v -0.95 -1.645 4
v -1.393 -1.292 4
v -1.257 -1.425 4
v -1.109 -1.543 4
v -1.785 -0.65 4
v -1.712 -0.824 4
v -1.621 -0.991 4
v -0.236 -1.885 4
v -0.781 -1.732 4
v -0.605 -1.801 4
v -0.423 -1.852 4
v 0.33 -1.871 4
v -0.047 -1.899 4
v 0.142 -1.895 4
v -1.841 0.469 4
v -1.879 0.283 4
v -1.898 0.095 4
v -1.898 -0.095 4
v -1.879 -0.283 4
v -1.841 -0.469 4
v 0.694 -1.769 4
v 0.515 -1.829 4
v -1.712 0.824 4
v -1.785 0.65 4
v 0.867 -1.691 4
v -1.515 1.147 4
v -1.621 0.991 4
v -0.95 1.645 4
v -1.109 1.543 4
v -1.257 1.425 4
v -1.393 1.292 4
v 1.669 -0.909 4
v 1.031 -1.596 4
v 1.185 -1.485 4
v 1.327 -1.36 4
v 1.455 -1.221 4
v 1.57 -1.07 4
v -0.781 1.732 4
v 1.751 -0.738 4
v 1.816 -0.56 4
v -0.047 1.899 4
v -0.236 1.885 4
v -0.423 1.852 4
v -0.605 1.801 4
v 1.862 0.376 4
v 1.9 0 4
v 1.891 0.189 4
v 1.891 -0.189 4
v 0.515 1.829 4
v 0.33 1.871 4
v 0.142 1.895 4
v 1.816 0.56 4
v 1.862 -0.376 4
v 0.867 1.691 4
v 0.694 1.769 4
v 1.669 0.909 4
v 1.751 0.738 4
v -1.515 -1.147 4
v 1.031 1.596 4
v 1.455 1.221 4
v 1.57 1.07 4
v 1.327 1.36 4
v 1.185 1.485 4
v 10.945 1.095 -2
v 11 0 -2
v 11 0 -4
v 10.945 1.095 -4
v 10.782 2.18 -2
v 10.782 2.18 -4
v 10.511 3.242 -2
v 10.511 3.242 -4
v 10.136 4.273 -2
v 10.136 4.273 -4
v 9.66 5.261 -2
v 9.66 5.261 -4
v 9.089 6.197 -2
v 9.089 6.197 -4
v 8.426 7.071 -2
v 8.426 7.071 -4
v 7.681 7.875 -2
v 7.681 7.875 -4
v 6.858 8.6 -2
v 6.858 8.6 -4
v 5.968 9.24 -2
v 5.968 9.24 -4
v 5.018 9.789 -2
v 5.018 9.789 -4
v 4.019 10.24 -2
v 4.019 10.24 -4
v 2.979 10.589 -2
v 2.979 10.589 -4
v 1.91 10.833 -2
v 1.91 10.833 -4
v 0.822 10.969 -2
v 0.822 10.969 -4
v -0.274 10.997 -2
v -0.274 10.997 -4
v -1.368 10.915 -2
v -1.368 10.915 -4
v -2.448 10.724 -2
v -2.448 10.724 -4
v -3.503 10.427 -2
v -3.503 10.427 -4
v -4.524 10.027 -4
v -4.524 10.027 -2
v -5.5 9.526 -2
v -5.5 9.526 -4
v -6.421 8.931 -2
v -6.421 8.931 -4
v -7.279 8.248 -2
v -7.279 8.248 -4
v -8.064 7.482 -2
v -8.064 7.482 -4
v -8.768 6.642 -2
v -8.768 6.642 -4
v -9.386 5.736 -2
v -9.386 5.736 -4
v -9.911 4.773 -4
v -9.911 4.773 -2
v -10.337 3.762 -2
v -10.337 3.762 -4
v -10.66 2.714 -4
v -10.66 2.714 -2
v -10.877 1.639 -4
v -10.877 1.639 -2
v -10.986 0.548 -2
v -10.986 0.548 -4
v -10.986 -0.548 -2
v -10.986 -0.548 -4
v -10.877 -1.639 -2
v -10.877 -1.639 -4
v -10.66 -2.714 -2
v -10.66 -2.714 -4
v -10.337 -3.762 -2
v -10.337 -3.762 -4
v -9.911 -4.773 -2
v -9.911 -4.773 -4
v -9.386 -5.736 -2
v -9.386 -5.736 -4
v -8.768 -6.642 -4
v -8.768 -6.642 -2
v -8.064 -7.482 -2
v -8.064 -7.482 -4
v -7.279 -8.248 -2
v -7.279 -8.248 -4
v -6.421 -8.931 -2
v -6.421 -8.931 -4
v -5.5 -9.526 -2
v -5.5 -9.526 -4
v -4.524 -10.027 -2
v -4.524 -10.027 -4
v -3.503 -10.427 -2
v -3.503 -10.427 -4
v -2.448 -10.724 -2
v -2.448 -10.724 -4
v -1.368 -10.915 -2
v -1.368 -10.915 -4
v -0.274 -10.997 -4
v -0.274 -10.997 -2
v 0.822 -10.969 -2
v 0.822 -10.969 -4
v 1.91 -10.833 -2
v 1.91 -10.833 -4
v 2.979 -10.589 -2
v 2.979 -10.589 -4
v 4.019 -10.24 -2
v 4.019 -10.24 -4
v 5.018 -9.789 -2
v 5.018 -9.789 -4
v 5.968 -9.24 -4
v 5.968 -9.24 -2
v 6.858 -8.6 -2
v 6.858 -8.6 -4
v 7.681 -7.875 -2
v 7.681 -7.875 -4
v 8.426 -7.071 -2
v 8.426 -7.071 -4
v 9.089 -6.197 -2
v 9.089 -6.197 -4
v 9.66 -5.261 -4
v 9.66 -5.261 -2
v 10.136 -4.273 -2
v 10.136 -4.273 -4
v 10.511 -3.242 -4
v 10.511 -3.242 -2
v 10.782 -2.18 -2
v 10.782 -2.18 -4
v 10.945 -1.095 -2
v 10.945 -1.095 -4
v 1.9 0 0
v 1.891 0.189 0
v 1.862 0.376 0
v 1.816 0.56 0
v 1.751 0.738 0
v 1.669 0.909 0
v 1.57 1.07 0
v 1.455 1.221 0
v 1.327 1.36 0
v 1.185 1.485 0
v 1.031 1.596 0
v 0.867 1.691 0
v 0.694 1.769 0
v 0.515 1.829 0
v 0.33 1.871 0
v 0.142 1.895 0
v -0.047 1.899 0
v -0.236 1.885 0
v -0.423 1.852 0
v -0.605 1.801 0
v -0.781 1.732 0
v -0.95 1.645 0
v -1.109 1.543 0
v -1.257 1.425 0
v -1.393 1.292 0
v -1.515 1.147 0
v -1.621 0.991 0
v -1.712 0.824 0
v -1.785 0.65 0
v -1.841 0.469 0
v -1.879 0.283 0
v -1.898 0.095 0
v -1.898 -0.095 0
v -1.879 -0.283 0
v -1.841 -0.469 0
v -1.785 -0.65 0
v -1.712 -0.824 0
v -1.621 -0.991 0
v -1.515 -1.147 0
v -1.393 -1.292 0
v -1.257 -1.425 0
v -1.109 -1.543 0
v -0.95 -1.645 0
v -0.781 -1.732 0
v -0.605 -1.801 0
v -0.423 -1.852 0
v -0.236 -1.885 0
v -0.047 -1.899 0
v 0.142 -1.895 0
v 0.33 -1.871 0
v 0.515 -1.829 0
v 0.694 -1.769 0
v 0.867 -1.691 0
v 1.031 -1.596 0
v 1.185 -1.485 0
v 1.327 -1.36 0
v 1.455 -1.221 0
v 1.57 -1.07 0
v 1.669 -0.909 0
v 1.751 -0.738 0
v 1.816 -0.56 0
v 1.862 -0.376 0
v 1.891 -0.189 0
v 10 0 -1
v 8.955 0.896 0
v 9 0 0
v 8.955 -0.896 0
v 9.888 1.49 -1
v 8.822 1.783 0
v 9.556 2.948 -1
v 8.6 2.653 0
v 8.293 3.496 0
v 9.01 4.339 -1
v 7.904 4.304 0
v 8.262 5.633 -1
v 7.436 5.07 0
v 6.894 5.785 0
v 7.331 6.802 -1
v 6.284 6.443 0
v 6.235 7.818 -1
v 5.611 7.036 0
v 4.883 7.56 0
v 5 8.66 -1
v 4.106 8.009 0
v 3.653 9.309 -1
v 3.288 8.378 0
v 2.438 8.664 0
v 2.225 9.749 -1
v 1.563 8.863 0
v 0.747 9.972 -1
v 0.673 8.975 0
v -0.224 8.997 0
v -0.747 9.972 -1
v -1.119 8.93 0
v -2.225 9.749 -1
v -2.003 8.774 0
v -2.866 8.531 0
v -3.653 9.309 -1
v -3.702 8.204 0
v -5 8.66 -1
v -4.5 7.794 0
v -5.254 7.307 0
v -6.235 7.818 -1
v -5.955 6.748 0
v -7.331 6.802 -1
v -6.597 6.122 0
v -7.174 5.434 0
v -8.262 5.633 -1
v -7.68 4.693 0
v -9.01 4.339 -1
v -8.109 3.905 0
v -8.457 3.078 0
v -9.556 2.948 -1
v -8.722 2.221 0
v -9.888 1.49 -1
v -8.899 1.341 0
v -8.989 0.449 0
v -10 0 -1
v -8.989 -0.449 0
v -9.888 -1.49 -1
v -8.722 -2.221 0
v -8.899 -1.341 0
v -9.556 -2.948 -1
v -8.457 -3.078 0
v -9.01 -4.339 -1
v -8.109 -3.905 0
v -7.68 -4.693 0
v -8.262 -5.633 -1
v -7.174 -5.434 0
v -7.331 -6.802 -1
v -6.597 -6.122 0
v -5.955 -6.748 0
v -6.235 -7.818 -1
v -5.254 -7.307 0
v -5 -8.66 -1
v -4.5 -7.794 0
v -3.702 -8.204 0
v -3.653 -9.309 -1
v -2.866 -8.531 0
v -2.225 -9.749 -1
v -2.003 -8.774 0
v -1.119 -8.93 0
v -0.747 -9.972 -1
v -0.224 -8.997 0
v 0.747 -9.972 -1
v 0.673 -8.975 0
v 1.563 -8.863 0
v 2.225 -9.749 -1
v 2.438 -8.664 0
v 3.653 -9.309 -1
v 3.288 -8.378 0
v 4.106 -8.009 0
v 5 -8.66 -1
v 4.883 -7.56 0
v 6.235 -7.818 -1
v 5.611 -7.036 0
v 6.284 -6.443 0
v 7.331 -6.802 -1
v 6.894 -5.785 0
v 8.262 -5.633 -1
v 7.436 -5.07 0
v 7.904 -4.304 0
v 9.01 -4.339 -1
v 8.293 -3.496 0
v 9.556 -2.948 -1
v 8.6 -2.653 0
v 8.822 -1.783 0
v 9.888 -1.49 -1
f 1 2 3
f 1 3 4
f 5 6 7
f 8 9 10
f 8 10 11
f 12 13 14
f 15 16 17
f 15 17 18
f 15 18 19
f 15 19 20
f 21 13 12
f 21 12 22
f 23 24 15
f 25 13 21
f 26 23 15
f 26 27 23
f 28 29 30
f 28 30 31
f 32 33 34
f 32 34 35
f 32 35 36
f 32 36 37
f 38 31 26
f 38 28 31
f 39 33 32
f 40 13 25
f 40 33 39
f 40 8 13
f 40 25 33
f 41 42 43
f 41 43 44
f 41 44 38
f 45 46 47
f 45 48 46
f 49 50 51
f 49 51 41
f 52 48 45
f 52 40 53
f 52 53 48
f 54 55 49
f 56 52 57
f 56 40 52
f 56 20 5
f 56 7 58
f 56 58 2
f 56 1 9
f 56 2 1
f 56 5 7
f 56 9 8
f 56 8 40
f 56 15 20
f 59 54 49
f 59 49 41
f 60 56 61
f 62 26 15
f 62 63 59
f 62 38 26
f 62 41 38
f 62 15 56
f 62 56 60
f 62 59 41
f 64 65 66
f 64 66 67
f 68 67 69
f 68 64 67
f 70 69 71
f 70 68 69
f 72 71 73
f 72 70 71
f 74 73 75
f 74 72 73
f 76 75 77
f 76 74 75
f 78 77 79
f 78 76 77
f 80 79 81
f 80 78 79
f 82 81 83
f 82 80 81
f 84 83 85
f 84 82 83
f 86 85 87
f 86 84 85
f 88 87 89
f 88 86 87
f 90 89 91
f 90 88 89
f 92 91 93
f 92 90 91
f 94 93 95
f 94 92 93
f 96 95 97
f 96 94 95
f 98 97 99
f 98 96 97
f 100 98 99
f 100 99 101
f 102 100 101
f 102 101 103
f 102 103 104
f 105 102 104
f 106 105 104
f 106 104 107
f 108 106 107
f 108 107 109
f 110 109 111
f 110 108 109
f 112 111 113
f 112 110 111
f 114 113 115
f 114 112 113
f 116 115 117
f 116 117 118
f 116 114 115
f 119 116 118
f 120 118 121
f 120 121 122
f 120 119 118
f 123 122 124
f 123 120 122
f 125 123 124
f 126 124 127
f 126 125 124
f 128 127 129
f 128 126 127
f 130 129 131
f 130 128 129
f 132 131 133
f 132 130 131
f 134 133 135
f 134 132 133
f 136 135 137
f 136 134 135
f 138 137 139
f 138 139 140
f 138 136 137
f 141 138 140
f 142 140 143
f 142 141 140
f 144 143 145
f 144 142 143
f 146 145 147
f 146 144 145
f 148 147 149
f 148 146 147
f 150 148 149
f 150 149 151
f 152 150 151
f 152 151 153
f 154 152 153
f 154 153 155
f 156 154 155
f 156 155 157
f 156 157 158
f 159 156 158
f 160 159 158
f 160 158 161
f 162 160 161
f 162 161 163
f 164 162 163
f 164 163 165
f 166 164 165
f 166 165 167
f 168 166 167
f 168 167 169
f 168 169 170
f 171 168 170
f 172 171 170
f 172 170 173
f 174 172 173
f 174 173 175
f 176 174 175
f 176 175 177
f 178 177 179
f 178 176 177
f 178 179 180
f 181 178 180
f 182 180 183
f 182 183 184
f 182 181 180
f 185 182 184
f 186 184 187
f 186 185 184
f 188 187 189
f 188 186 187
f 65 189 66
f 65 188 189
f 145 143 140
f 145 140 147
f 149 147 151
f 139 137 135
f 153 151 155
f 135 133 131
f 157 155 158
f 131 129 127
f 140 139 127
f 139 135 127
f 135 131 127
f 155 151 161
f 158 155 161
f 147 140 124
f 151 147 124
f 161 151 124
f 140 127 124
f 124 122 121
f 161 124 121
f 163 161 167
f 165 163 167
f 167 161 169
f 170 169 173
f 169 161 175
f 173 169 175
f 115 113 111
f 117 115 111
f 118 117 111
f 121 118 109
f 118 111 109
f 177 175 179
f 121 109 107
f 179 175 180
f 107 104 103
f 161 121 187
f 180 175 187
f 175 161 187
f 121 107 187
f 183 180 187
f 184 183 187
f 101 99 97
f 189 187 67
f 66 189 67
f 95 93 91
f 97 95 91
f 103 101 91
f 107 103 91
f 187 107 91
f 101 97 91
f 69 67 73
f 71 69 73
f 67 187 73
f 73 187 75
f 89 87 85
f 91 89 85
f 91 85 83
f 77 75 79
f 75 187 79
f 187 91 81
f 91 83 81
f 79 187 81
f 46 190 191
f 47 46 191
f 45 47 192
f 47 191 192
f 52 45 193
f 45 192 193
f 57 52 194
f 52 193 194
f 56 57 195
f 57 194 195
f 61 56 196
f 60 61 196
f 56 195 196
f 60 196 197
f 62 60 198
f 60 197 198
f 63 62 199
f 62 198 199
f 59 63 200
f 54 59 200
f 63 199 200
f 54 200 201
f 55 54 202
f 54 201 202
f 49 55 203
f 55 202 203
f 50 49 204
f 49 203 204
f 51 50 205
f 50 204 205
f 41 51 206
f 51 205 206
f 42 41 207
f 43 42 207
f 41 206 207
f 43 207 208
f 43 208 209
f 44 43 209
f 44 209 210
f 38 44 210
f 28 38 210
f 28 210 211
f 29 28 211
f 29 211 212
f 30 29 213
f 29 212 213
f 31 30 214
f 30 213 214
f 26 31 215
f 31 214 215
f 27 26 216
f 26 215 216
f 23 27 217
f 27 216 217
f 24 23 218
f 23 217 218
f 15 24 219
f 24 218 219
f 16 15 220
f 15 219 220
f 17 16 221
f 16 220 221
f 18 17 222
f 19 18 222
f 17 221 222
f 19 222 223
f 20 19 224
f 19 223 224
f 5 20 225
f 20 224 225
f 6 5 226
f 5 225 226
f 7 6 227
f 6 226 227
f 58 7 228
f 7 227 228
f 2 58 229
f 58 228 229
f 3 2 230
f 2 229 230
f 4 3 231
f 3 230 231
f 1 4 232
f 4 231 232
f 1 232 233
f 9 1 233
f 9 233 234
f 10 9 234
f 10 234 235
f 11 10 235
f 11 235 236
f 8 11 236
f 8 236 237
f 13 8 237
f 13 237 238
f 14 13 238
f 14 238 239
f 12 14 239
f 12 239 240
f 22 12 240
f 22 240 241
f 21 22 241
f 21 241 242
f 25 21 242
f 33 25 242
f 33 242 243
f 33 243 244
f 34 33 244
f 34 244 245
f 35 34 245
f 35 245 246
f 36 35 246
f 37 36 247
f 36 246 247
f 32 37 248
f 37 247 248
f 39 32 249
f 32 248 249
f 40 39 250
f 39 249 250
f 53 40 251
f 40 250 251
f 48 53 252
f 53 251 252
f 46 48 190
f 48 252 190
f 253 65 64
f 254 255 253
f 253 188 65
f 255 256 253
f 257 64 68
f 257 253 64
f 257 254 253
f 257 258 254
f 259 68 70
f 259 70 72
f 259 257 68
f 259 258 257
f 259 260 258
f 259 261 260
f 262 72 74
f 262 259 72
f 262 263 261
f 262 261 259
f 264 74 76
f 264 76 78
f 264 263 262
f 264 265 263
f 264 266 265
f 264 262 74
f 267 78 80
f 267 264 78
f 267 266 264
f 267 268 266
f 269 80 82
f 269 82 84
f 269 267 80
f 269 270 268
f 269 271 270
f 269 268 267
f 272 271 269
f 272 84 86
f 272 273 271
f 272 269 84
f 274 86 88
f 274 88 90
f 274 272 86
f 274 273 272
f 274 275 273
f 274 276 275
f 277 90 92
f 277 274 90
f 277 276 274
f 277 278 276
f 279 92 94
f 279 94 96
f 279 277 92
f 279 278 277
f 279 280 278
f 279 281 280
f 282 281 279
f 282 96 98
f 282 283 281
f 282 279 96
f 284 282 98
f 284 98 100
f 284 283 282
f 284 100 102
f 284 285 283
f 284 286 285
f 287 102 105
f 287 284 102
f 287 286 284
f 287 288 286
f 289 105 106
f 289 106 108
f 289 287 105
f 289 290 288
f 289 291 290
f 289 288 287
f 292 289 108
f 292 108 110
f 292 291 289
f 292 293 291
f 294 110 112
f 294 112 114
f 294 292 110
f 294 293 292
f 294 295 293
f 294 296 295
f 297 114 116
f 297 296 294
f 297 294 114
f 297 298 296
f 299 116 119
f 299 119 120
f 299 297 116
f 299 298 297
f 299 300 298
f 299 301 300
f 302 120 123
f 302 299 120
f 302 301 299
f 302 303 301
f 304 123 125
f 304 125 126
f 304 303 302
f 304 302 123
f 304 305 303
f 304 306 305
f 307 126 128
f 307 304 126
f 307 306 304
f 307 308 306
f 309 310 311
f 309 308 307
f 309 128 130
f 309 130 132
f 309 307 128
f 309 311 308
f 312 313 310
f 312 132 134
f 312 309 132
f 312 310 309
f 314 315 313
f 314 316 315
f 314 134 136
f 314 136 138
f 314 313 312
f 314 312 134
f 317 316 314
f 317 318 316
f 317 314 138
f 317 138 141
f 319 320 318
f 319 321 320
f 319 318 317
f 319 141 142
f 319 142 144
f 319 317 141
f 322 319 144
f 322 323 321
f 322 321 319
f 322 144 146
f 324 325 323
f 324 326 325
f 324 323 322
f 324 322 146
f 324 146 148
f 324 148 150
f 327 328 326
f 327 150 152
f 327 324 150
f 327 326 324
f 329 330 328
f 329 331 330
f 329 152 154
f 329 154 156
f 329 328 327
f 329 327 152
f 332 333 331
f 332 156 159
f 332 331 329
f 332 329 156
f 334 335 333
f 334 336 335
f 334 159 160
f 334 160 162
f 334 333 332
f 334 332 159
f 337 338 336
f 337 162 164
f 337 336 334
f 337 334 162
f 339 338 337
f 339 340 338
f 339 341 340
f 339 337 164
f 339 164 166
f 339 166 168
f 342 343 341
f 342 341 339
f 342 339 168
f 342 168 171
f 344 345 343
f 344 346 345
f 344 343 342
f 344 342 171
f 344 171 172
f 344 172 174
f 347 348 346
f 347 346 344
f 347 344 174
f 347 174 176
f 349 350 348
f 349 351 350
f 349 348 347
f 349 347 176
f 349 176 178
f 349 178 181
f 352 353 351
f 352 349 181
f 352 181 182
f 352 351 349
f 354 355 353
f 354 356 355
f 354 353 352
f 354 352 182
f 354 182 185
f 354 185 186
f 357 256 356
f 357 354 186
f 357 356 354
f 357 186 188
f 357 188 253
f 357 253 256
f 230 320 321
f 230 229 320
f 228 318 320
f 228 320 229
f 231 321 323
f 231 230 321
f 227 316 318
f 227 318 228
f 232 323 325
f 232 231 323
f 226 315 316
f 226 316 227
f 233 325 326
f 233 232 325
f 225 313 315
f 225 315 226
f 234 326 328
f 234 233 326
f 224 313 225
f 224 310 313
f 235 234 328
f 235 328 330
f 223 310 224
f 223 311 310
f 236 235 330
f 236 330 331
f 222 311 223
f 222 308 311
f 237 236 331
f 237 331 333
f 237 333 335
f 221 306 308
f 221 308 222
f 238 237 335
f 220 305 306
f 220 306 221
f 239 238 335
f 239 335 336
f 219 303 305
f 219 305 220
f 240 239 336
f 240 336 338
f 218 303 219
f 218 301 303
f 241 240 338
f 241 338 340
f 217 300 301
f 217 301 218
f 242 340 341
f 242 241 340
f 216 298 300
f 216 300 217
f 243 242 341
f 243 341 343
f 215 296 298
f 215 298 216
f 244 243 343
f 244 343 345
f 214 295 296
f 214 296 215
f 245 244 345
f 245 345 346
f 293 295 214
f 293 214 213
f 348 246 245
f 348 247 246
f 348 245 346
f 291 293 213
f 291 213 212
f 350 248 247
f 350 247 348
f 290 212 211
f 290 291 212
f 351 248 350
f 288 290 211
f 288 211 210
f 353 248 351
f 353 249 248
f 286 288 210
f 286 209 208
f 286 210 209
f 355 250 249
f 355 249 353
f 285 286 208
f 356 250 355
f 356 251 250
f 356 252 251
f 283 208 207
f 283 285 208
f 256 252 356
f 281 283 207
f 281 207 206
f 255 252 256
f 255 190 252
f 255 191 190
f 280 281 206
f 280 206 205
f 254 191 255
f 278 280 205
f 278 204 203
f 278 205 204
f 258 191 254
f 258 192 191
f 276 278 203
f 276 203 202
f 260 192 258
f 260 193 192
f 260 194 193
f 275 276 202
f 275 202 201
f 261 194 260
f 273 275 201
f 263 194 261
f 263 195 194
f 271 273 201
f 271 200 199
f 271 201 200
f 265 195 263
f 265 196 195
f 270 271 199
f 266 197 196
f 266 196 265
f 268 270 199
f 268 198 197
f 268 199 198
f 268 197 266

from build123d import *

# Parameters (mm, degrees)
F0_R     = 11
F1_DEPTH = 4
F2_R     = 1.9
F3_DEPTH = 4
F4_SIZE  = 2


with BuildPart() as f1:
    # F0 (on Top) → F1 (new body)
    with BuildSketch(Plane.XY):
        Circle(F0_R)
    extrude(amount=-F1_DEPTH)

    # F2 (on face) → F3 (join)
    with BuildSketch(Plane.XY):
        Circle(F2_R)
    extrude(amount=F3_DEPTH)

    # F4
    f4_edges = [f1.edges().sort_by_distance(p)[0] for p in [
        (-11, 0, 0),
    ]]
    chamfer(f4_edges, length=F4_SIZE)


solid = f1.part
